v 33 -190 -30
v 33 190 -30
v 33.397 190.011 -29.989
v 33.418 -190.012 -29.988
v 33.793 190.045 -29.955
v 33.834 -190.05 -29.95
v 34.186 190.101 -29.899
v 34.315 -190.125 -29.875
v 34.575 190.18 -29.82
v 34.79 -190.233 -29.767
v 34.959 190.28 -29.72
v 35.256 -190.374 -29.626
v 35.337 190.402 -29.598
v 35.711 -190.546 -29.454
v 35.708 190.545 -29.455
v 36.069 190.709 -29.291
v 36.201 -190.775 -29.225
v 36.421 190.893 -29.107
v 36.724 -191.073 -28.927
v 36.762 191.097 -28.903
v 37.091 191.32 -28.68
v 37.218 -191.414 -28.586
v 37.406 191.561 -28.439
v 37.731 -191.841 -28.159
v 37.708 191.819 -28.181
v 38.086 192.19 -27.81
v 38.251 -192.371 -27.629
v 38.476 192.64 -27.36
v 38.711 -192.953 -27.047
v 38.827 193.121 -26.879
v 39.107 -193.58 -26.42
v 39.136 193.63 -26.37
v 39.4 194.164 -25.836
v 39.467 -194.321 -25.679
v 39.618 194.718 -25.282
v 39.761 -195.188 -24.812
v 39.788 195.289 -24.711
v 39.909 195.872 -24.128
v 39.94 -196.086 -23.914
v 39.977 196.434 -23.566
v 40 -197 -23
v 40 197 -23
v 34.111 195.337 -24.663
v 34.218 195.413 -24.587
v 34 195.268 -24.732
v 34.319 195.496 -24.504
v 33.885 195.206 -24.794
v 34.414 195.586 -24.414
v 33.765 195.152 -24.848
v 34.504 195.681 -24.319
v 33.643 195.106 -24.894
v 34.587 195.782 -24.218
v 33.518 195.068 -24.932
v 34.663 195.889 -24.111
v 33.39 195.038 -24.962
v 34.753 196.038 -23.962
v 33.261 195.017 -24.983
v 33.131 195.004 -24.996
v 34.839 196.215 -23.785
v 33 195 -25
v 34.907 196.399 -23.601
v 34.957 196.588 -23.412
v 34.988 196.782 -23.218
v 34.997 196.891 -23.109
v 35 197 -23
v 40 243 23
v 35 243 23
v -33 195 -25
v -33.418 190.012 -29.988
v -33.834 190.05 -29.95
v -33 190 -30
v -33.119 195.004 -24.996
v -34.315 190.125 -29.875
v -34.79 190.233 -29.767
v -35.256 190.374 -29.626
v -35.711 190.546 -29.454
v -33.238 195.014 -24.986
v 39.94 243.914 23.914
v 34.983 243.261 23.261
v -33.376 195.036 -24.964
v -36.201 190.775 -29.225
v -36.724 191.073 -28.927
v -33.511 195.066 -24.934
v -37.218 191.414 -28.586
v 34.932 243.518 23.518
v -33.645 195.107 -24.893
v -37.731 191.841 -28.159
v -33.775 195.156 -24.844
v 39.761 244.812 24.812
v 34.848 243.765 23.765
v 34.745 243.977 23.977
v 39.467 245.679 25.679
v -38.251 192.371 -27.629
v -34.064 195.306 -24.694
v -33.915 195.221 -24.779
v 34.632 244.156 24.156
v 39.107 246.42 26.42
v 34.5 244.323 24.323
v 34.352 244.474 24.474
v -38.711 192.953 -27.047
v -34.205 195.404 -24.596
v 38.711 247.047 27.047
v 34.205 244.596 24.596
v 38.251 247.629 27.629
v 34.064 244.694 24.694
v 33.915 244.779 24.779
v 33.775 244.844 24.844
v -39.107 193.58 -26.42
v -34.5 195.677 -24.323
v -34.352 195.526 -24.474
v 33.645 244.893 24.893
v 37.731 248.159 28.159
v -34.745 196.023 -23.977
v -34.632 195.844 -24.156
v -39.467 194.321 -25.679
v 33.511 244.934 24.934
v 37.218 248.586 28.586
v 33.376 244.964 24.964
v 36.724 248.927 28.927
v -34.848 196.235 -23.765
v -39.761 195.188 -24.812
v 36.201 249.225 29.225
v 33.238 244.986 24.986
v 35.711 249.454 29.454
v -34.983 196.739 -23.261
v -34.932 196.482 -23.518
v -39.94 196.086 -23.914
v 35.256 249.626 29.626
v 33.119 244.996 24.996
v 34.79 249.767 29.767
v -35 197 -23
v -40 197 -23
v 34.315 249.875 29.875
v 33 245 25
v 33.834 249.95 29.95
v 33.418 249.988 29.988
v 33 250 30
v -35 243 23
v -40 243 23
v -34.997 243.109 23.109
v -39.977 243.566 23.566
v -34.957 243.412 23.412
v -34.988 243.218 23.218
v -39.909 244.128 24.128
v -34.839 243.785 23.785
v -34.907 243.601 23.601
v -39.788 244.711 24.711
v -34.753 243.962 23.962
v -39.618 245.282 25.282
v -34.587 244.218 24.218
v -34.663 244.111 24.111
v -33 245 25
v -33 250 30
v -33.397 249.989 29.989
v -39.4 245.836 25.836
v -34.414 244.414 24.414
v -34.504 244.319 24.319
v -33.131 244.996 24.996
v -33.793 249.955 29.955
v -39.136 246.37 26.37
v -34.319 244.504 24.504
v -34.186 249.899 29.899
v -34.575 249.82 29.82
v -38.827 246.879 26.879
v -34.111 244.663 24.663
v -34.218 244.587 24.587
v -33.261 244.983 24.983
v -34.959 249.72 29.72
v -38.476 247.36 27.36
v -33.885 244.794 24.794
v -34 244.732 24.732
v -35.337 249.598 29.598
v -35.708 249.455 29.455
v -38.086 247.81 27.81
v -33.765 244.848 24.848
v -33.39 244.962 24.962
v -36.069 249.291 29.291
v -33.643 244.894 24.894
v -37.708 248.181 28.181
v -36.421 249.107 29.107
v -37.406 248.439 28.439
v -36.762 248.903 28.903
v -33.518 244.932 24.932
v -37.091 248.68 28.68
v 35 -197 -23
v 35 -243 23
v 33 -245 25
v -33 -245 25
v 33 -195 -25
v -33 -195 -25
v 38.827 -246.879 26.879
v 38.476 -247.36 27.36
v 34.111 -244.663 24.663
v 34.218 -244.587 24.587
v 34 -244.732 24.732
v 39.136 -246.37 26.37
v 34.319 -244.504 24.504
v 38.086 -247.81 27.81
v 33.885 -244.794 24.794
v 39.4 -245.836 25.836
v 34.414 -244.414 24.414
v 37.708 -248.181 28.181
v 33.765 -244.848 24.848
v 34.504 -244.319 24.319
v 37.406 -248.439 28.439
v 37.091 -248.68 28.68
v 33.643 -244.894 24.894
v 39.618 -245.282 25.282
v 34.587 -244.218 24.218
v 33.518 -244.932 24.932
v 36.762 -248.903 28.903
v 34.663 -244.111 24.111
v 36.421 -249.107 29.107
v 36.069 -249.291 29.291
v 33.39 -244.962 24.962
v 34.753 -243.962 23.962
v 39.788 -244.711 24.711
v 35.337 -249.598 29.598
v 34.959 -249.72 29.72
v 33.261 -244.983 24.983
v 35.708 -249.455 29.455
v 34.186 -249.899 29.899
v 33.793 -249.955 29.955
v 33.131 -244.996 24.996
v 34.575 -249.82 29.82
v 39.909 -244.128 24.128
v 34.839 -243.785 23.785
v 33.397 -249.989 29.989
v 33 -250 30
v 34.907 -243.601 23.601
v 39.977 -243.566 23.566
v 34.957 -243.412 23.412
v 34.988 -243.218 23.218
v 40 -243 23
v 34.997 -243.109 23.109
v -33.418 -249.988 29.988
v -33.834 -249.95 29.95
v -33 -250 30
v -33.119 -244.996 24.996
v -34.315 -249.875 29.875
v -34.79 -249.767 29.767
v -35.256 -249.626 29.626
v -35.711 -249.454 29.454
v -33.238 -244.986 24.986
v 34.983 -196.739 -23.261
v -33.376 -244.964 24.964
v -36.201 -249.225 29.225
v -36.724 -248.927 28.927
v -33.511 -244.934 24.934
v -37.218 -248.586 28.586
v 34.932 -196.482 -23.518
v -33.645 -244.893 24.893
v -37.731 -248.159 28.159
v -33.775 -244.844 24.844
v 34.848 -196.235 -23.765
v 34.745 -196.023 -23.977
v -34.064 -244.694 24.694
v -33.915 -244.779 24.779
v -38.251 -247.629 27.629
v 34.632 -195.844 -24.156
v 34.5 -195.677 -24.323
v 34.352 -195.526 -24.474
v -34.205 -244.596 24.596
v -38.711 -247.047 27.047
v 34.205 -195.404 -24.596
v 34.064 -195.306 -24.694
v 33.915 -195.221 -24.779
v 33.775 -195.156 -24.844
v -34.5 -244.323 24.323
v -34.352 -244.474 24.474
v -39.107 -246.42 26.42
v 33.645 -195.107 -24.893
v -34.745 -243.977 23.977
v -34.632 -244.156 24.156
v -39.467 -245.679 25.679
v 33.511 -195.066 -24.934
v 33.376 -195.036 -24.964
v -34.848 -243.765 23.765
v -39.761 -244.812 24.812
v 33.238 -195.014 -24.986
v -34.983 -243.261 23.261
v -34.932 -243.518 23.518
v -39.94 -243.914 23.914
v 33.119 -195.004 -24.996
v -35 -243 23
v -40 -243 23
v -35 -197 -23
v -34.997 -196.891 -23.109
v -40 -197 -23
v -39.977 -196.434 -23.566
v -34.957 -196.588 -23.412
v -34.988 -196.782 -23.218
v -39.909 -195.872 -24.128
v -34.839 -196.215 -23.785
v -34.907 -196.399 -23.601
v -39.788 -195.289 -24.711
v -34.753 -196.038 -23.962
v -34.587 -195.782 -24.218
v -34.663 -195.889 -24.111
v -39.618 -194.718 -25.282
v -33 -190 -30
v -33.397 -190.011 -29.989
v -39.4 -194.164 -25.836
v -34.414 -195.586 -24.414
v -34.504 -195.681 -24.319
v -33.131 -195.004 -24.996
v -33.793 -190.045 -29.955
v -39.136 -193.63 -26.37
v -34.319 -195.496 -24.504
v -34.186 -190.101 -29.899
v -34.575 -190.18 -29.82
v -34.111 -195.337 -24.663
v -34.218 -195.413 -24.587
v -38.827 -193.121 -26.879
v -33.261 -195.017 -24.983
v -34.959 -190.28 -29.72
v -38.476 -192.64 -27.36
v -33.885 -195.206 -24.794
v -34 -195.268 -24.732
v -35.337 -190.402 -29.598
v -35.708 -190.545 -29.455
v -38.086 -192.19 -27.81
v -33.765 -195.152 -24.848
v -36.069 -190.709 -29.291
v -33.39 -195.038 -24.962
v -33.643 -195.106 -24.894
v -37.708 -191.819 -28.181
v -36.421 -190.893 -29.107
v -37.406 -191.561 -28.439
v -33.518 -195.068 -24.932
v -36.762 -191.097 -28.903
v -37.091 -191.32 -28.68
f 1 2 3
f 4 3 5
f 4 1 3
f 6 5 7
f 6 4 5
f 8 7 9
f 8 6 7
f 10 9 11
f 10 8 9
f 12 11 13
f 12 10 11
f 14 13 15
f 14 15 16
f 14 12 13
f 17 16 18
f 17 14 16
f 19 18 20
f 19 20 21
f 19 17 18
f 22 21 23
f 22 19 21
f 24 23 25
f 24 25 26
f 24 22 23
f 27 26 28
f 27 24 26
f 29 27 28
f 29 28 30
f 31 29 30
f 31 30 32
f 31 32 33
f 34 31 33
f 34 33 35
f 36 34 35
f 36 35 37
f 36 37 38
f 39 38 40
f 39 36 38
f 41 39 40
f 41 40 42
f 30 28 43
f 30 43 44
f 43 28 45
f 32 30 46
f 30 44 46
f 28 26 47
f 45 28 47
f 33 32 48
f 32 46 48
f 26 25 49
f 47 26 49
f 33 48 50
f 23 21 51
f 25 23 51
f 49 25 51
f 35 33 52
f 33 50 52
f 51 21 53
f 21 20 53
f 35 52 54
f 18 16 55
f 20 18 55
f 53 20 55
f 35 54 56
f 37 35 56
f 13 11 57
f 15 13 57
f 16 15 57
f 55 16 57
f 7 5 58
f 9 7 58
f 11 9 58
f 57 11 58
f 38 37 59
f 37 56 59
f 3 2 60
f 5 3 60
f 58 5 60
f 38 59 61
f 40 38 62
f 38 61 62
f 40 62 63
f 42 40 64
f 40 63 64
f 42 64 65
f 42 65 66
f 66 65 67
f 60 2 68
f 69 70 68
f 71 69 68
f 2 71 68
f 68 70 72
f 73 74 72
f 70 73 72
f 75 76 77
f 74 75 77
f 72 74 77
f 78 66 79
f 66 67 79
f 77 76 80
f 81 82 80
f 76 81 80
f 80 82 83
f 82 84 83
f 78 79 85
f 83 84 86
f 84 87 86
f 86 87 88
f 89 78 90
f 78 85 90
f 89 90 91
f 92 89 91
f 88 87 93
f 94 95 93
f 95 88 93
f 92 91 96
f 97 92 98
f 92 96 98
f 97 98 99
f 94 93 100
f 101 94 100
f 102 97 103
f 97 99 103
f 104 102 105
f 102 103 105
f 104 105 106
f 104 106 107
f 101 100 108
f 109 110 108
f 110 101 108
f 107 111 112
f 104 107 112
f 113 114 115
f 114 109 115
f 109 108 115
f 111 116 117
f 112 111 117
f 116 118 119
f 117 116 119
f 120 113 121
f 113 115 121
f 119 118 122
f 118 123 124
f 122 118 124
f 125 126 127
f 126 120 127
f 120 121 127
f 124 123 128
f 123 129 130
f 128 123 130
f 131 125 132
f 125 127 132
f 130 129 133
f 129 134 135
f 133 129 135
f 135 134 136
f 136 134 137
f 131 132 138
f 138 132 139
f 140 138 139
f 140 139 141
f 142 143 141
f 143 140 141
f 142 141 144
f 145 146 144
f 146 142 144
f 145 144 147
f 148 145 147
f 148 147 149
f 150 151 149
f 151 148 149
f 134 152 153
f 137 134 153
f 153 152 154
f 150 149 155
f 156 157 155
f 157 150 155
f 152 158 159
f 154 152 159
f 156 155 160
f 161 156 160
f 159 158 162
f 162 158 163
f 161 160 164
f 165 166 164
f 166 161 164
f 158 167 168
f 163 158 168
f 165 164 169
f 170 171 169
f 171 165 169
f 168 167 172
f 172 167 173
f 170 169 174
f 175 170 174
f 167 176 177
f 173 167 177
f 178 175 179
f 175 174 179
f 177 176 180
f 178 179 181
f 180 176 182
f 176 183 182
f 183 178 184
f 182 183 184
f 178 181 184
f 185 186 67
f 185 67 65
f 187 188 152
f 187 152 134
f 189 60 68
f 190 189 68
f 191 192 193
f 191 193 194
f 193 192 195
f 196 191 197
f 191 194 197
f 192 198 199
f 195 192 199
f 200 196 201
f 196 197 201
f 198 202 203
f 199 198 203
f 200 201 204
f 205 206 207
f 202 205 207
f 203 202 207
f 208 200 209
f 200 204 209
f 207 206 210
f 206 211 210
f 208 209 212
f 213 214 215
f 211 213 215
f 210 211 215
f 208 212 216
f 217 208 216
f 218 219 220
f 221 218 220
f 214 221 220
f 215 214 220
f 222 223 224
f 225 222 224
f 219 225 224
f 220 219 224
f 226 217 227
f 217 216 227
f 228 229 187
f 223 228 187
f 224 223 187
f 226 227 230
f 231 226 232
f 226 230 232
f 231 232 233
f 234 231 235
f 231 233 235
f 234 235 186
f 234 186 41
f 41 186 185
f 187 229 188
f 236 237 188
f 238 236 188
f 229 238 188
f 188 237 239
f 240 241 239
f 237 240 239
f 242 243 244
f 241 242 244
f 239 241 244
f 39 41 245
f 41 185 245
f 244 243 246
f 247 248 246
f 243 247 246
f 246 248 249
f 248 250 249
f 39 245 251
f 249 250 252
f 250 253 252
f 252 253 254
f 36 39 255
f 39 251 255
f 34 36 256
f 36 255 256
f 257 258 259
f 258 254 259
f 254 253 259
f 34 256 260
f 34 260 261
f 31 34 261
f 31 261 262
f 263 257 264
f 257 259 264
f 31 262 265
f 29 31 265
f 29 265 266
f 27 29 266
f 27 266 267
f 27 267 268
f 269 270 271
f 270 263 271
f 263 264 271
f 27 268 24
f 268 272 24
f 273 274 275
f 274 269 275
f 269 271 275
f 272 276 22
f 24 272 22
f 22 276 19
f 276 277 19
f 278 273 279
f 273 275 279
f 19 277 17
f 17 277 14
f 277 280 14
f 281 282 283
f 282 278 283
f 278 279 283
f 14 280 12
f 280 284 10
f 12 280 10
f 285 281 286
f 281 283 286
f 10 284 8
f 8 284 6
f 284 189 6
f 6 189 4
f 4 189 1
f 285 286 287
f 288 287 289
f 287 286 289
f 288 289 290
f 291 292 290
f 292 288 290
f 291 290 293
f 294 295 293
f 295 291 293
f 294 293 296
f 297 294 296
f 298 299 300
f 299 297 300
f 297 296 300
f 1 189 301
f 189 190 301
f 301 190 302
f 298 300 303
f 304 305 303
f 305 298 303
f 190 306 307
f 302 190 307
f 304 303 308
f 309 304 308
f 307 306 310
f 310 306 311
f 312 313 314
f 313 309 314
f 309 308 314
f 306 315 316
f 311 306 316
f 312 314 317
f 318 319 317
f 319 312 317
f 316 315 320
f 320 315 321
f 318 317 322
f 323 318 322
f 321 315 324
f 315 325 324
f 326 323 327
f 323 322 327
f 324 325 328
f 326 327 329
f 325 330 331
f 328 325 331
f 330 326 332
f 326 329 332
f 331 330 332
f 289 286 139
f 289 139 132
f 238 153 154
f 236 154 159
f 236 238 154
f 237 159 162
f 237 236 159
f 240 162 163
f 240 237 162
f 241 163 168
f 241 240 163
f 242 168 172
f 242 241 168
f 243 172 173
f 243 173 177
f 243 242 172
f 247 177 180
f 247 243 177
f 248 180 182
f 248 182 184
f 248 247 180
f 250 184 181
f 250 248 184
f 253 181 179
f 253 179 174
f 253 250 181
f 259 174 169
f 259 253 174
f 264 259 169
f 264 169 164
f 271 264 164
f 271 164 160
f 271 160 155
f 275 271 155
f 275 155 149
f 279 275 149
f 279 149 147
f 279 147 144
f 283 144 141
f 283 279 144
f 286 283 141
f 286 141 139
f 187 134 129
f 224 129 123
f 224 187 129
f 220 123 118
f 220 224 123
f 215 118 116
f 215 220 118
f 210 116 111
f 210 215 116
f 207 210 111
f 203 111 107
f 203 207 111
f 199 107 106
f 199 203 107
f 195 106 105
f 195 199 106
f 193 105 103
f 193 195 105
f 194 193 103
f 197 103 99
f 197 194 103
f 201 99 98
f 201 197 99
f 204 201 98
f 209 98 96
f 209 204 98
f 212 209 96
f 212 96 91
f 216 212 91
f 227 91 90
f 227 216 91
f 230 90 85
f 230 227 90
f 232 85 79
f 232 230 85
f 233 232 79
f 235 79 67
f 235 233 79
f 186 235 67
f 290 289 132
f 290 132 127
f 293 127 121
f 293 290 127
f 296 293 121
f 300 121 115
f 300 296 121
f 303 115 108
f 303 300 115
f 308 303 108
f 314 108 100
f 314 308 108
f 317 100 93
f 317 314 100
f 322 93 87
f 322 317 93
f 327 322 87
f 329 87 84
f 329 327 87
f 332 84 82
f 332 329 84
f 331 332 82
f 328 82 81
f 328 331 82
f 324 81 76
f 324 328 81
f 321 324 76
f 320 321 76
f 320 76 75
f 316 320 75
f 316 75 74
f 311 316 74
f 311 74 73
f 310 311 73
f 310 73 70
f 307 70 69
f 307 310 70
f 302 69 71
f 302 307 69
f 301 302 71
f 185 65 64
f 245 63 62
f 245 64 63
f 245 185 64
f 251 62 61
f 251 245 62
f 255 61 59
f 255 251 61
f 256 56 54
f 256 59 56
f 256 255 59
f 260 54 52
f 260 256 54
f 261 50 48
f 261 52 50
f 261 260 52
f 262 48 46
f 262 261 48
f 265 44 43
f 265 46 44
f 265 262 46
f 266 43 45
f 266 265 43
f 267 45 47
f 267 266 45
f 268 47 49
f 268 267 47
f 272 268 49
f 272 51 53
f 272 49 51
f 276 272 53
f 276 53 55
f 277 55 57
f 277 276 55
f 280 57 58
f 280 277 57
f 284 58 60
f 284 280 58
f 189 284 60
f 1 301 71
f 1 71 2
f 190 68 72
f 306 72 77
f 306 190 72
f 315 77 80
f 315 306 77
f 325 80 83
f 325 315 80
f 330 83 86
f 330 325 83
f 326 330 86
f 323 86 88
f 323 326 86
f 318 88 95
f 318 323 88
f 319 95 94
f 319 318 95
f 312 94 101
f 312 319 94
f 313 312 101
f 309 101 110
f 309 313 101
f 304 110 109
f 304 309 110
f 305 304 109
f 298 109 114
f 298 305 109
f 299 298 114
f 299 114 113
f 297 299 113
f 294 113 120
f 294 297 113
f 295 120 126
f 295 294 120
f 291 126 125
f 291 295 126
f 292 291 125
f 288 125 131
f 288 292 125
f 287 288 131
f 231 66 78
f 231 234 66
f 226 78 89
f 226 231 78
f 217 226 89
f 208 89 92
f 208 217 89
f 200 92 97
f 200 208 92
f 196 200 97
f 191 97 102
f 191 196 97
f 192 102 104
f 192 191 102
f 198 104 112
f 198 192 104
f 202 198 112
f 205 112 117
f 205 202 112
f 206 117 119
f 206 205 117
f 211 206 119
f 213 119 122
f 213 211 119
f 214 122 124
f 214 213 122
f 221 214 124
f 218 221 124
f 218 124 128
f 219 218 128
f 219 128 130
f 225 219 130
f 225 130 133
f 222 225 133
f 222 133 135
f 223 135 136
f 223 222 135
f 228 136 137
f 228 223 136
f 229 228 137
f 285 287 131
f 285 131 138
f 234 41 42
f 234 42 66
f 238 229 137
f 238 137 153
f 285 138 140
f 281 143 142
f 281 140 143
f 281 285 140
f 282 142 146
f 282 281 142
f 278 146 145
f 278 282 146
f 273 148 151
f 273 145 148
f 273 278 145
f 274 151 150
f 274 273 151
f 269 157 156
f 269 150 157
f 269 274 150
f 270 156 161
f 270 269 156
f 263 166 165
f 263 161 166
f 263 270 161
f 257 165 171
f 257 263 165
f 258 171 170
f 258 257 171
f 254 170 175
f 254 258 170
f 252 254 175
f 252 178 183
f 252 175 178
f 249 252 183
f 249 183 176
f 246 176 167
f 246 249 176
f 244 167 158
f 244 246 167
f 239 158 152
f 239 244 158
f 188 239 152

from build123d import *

# Parameters (mm, degrees)
F1_DEPTH = 250
F3_DEPTH = 200


with BuildPart() as f1:
    # F0 (on Front) → F1 (new body, symmetric)
    with BuildSketch(Plane.XZ):
        with BuildLine():
            ThreePointArc((40, 23), (37.9497474683, 27.9497474683), (33, 30))
            Line((33, 30), (-33, 30))
            ThreePointArc((-33, 30), (-37.9497474683, 27.9497474683), (-40, 23))
            Line((-40, 23), (-40, -23))
            ThreePointArc((-40, -23), (-37.9497474683, -27.9497474683), (-33, -30))
            Line((-33, -30), (33, -30))
            ThreePointArc((33, -30), (37.9497474683, -27.9497474683), (40, -23))
            Line((40, -23), (40, 23))
        make_face()
        with BuildLine():
            Line((-33, 25), (33, 25))
            ThreePointArc((33, 25), (34.4142135624, 24.4142135624), (35, 23))
            Line((35, 23), (35, -23))
            ThreePointArc((35, -23), (34.4142135624, -24.4142135624), (33, -25))
            Line((33, -25), (-33, -25))
            ThreePointArc((-33, -25), (-34.4142135624, -24.4142135624), (-35, -23))
            Line((-35, -23), (-35, 23))
            ThreePointArc((-35, 23), (-34.4142135624, 24.4142135624), (-33, 25))
        make_face(mode=Mode.SUBTRACT)
    extrude(amount=F1_DEPTH, both=True)

    # F2 (on face) → F3 (cut)
    with BuildSketch(Plane(origin=(-40, 0, 0), x_dir=(0, -1, 0), z_dir=(-1, 0, 0))):
        Polygon((-250, -30), (-190, -30), (-197, -23), (-250, -23), align=None)
        Polygon((-250, -23), (-197, -23), (-243, 23), (-250, 23), align=None)
        Polygon((-250, 23), (-243, 23), (-250, 30), align=None)
        Polygon((243, 23), (197, -23), (250, -23), (250, 23), align=None)
        Polygon((250, -23), (197, -23), (190, -30), (250, -30), align=None)
        Polygon((250, 30), (243, 23), (250, 23), align=None)
    extrude(amount=-F3_DEPTH, mode=Mode.SUBTRACT)


solid = f1.part
